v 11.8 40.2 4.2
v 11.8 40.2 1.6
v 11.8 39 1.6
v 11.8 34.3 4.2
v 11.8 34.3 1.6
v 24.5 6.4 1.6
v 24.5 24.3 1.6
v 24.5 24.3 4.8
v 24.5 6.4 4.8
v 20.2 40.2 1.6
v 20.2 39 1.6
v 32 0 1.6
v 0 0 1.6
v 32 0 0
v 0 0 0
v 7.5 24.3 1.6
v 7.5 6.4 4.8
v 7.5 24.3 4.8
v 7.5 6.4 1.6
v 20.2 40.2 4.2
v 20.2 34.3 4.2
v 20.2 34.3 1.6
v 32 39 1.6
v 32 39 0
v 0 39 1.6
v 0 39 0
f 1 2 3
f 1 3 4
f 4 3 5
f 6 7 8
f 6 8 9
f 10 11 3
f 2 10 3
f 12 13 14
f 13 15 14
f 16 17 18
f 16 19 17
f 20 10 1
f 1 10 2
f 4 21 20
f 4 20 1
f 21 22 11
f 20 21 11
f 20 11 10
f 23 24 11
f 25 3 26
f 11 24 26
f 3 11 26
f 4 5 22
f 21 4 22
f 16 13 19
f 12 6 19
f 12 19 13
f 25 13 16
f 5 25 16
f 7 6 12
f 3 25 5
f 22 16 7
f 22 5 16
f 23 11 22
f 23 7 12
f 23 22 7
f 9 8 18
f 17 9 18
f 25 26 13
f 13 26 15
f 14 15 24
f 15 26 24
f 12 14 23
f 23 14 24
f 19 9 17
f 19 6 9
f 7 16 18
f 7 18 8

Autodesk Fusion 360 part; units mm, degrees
sketch "Sketch1" plane through (0, 0, 0) normal (0, 0, 1) x (1, 0, 0)
  line L0 (0, 0) -> (32, 0)
  line L1 (32, 0) -> (32, 39)
  line L2 (32, 39) -> (0, 39)
  line L3 (0, 39) -> (0, 0)
  dimension "d1" = 32
  dimension "d2" = 39
extrude "Extrude1" add sketch "Sketch1" along normal blind 1.6
sketch "Sketch2" plane through (0, 0, 1.6) normal (0, 0, 1) x (-1, 0, 0)
  line L0 (0, -39) -> (0, 0)
  line L1 (0, 0) -> (-32, 0)
  line L2 (-32, 0) -> (-32, -39)
  line L3 (-32, -39) -> (0, -39)
  line L4 (-7.5, -24.3) -> (-24.5, -24.3)
  line L5 (-24.5, -24.3) -> (-24.5, -6.4)
  line L6 (-24.5, -6.4) -> (-7.5, -6.4)
  line L7 (-7.5, -6.4) -> (-7.5, -24.3)
  dimension "d5" = 14.7
  dimension "d6" = 6.4
  dimension "d7" = 7.5
  dimension "d8" = 7.5
extrude "Extrude2" add sketch "Sketch2" along normal blind 3.2 contours L4 L5 L6 L7
sketch "Sketch3" plane through (0, 0, 1.6) normal (0, 0, 1) x (-1, 0, 0)
  line L0 (-7.5, -6.4) -> (-7.5, -24.3)
  line L1 (-7.5, -24.3) -> (-24.5, -24.3)
  line L2 (-24.5, -24.3) -> (-24.5, -6.4)
  line L3 (-24.5, -6.4) -> (-7.5, -6.4)
  line L4 (0, -39) -> (0, 0)
  line L5 (0, 0) -> (-32, 0)
  line L6 (-32, 0) -> (-32, -39)
  line L7 (-32, -39) -> (0, -39)
  line L8 (-11.8, -34.3) -> (-20.2, -34.3)
  line L9 (-20.2, -34.3) -> (-20.2, -40.2)
  line L10 (-20.2, -40.2) -> (-11.8, -40.2)
  line L11 (-11.8, -40.2) -> (-11.8, -34.3)
  dimension "d11" = 11.8
  dimension "d12" = 11.8
  dimension "d14" = 1.2
  dimension "d15" = 4.7
extrude "Extrude3" add sketch "Sketch3" along normal blind 2.6 contours L7 L9 L10 L11 | L7 L8 L9 L11
equation "d9 = 4.8 mm - 1.6 mm"
equation "d16 = 4.2 mm - 1.6 mm"
